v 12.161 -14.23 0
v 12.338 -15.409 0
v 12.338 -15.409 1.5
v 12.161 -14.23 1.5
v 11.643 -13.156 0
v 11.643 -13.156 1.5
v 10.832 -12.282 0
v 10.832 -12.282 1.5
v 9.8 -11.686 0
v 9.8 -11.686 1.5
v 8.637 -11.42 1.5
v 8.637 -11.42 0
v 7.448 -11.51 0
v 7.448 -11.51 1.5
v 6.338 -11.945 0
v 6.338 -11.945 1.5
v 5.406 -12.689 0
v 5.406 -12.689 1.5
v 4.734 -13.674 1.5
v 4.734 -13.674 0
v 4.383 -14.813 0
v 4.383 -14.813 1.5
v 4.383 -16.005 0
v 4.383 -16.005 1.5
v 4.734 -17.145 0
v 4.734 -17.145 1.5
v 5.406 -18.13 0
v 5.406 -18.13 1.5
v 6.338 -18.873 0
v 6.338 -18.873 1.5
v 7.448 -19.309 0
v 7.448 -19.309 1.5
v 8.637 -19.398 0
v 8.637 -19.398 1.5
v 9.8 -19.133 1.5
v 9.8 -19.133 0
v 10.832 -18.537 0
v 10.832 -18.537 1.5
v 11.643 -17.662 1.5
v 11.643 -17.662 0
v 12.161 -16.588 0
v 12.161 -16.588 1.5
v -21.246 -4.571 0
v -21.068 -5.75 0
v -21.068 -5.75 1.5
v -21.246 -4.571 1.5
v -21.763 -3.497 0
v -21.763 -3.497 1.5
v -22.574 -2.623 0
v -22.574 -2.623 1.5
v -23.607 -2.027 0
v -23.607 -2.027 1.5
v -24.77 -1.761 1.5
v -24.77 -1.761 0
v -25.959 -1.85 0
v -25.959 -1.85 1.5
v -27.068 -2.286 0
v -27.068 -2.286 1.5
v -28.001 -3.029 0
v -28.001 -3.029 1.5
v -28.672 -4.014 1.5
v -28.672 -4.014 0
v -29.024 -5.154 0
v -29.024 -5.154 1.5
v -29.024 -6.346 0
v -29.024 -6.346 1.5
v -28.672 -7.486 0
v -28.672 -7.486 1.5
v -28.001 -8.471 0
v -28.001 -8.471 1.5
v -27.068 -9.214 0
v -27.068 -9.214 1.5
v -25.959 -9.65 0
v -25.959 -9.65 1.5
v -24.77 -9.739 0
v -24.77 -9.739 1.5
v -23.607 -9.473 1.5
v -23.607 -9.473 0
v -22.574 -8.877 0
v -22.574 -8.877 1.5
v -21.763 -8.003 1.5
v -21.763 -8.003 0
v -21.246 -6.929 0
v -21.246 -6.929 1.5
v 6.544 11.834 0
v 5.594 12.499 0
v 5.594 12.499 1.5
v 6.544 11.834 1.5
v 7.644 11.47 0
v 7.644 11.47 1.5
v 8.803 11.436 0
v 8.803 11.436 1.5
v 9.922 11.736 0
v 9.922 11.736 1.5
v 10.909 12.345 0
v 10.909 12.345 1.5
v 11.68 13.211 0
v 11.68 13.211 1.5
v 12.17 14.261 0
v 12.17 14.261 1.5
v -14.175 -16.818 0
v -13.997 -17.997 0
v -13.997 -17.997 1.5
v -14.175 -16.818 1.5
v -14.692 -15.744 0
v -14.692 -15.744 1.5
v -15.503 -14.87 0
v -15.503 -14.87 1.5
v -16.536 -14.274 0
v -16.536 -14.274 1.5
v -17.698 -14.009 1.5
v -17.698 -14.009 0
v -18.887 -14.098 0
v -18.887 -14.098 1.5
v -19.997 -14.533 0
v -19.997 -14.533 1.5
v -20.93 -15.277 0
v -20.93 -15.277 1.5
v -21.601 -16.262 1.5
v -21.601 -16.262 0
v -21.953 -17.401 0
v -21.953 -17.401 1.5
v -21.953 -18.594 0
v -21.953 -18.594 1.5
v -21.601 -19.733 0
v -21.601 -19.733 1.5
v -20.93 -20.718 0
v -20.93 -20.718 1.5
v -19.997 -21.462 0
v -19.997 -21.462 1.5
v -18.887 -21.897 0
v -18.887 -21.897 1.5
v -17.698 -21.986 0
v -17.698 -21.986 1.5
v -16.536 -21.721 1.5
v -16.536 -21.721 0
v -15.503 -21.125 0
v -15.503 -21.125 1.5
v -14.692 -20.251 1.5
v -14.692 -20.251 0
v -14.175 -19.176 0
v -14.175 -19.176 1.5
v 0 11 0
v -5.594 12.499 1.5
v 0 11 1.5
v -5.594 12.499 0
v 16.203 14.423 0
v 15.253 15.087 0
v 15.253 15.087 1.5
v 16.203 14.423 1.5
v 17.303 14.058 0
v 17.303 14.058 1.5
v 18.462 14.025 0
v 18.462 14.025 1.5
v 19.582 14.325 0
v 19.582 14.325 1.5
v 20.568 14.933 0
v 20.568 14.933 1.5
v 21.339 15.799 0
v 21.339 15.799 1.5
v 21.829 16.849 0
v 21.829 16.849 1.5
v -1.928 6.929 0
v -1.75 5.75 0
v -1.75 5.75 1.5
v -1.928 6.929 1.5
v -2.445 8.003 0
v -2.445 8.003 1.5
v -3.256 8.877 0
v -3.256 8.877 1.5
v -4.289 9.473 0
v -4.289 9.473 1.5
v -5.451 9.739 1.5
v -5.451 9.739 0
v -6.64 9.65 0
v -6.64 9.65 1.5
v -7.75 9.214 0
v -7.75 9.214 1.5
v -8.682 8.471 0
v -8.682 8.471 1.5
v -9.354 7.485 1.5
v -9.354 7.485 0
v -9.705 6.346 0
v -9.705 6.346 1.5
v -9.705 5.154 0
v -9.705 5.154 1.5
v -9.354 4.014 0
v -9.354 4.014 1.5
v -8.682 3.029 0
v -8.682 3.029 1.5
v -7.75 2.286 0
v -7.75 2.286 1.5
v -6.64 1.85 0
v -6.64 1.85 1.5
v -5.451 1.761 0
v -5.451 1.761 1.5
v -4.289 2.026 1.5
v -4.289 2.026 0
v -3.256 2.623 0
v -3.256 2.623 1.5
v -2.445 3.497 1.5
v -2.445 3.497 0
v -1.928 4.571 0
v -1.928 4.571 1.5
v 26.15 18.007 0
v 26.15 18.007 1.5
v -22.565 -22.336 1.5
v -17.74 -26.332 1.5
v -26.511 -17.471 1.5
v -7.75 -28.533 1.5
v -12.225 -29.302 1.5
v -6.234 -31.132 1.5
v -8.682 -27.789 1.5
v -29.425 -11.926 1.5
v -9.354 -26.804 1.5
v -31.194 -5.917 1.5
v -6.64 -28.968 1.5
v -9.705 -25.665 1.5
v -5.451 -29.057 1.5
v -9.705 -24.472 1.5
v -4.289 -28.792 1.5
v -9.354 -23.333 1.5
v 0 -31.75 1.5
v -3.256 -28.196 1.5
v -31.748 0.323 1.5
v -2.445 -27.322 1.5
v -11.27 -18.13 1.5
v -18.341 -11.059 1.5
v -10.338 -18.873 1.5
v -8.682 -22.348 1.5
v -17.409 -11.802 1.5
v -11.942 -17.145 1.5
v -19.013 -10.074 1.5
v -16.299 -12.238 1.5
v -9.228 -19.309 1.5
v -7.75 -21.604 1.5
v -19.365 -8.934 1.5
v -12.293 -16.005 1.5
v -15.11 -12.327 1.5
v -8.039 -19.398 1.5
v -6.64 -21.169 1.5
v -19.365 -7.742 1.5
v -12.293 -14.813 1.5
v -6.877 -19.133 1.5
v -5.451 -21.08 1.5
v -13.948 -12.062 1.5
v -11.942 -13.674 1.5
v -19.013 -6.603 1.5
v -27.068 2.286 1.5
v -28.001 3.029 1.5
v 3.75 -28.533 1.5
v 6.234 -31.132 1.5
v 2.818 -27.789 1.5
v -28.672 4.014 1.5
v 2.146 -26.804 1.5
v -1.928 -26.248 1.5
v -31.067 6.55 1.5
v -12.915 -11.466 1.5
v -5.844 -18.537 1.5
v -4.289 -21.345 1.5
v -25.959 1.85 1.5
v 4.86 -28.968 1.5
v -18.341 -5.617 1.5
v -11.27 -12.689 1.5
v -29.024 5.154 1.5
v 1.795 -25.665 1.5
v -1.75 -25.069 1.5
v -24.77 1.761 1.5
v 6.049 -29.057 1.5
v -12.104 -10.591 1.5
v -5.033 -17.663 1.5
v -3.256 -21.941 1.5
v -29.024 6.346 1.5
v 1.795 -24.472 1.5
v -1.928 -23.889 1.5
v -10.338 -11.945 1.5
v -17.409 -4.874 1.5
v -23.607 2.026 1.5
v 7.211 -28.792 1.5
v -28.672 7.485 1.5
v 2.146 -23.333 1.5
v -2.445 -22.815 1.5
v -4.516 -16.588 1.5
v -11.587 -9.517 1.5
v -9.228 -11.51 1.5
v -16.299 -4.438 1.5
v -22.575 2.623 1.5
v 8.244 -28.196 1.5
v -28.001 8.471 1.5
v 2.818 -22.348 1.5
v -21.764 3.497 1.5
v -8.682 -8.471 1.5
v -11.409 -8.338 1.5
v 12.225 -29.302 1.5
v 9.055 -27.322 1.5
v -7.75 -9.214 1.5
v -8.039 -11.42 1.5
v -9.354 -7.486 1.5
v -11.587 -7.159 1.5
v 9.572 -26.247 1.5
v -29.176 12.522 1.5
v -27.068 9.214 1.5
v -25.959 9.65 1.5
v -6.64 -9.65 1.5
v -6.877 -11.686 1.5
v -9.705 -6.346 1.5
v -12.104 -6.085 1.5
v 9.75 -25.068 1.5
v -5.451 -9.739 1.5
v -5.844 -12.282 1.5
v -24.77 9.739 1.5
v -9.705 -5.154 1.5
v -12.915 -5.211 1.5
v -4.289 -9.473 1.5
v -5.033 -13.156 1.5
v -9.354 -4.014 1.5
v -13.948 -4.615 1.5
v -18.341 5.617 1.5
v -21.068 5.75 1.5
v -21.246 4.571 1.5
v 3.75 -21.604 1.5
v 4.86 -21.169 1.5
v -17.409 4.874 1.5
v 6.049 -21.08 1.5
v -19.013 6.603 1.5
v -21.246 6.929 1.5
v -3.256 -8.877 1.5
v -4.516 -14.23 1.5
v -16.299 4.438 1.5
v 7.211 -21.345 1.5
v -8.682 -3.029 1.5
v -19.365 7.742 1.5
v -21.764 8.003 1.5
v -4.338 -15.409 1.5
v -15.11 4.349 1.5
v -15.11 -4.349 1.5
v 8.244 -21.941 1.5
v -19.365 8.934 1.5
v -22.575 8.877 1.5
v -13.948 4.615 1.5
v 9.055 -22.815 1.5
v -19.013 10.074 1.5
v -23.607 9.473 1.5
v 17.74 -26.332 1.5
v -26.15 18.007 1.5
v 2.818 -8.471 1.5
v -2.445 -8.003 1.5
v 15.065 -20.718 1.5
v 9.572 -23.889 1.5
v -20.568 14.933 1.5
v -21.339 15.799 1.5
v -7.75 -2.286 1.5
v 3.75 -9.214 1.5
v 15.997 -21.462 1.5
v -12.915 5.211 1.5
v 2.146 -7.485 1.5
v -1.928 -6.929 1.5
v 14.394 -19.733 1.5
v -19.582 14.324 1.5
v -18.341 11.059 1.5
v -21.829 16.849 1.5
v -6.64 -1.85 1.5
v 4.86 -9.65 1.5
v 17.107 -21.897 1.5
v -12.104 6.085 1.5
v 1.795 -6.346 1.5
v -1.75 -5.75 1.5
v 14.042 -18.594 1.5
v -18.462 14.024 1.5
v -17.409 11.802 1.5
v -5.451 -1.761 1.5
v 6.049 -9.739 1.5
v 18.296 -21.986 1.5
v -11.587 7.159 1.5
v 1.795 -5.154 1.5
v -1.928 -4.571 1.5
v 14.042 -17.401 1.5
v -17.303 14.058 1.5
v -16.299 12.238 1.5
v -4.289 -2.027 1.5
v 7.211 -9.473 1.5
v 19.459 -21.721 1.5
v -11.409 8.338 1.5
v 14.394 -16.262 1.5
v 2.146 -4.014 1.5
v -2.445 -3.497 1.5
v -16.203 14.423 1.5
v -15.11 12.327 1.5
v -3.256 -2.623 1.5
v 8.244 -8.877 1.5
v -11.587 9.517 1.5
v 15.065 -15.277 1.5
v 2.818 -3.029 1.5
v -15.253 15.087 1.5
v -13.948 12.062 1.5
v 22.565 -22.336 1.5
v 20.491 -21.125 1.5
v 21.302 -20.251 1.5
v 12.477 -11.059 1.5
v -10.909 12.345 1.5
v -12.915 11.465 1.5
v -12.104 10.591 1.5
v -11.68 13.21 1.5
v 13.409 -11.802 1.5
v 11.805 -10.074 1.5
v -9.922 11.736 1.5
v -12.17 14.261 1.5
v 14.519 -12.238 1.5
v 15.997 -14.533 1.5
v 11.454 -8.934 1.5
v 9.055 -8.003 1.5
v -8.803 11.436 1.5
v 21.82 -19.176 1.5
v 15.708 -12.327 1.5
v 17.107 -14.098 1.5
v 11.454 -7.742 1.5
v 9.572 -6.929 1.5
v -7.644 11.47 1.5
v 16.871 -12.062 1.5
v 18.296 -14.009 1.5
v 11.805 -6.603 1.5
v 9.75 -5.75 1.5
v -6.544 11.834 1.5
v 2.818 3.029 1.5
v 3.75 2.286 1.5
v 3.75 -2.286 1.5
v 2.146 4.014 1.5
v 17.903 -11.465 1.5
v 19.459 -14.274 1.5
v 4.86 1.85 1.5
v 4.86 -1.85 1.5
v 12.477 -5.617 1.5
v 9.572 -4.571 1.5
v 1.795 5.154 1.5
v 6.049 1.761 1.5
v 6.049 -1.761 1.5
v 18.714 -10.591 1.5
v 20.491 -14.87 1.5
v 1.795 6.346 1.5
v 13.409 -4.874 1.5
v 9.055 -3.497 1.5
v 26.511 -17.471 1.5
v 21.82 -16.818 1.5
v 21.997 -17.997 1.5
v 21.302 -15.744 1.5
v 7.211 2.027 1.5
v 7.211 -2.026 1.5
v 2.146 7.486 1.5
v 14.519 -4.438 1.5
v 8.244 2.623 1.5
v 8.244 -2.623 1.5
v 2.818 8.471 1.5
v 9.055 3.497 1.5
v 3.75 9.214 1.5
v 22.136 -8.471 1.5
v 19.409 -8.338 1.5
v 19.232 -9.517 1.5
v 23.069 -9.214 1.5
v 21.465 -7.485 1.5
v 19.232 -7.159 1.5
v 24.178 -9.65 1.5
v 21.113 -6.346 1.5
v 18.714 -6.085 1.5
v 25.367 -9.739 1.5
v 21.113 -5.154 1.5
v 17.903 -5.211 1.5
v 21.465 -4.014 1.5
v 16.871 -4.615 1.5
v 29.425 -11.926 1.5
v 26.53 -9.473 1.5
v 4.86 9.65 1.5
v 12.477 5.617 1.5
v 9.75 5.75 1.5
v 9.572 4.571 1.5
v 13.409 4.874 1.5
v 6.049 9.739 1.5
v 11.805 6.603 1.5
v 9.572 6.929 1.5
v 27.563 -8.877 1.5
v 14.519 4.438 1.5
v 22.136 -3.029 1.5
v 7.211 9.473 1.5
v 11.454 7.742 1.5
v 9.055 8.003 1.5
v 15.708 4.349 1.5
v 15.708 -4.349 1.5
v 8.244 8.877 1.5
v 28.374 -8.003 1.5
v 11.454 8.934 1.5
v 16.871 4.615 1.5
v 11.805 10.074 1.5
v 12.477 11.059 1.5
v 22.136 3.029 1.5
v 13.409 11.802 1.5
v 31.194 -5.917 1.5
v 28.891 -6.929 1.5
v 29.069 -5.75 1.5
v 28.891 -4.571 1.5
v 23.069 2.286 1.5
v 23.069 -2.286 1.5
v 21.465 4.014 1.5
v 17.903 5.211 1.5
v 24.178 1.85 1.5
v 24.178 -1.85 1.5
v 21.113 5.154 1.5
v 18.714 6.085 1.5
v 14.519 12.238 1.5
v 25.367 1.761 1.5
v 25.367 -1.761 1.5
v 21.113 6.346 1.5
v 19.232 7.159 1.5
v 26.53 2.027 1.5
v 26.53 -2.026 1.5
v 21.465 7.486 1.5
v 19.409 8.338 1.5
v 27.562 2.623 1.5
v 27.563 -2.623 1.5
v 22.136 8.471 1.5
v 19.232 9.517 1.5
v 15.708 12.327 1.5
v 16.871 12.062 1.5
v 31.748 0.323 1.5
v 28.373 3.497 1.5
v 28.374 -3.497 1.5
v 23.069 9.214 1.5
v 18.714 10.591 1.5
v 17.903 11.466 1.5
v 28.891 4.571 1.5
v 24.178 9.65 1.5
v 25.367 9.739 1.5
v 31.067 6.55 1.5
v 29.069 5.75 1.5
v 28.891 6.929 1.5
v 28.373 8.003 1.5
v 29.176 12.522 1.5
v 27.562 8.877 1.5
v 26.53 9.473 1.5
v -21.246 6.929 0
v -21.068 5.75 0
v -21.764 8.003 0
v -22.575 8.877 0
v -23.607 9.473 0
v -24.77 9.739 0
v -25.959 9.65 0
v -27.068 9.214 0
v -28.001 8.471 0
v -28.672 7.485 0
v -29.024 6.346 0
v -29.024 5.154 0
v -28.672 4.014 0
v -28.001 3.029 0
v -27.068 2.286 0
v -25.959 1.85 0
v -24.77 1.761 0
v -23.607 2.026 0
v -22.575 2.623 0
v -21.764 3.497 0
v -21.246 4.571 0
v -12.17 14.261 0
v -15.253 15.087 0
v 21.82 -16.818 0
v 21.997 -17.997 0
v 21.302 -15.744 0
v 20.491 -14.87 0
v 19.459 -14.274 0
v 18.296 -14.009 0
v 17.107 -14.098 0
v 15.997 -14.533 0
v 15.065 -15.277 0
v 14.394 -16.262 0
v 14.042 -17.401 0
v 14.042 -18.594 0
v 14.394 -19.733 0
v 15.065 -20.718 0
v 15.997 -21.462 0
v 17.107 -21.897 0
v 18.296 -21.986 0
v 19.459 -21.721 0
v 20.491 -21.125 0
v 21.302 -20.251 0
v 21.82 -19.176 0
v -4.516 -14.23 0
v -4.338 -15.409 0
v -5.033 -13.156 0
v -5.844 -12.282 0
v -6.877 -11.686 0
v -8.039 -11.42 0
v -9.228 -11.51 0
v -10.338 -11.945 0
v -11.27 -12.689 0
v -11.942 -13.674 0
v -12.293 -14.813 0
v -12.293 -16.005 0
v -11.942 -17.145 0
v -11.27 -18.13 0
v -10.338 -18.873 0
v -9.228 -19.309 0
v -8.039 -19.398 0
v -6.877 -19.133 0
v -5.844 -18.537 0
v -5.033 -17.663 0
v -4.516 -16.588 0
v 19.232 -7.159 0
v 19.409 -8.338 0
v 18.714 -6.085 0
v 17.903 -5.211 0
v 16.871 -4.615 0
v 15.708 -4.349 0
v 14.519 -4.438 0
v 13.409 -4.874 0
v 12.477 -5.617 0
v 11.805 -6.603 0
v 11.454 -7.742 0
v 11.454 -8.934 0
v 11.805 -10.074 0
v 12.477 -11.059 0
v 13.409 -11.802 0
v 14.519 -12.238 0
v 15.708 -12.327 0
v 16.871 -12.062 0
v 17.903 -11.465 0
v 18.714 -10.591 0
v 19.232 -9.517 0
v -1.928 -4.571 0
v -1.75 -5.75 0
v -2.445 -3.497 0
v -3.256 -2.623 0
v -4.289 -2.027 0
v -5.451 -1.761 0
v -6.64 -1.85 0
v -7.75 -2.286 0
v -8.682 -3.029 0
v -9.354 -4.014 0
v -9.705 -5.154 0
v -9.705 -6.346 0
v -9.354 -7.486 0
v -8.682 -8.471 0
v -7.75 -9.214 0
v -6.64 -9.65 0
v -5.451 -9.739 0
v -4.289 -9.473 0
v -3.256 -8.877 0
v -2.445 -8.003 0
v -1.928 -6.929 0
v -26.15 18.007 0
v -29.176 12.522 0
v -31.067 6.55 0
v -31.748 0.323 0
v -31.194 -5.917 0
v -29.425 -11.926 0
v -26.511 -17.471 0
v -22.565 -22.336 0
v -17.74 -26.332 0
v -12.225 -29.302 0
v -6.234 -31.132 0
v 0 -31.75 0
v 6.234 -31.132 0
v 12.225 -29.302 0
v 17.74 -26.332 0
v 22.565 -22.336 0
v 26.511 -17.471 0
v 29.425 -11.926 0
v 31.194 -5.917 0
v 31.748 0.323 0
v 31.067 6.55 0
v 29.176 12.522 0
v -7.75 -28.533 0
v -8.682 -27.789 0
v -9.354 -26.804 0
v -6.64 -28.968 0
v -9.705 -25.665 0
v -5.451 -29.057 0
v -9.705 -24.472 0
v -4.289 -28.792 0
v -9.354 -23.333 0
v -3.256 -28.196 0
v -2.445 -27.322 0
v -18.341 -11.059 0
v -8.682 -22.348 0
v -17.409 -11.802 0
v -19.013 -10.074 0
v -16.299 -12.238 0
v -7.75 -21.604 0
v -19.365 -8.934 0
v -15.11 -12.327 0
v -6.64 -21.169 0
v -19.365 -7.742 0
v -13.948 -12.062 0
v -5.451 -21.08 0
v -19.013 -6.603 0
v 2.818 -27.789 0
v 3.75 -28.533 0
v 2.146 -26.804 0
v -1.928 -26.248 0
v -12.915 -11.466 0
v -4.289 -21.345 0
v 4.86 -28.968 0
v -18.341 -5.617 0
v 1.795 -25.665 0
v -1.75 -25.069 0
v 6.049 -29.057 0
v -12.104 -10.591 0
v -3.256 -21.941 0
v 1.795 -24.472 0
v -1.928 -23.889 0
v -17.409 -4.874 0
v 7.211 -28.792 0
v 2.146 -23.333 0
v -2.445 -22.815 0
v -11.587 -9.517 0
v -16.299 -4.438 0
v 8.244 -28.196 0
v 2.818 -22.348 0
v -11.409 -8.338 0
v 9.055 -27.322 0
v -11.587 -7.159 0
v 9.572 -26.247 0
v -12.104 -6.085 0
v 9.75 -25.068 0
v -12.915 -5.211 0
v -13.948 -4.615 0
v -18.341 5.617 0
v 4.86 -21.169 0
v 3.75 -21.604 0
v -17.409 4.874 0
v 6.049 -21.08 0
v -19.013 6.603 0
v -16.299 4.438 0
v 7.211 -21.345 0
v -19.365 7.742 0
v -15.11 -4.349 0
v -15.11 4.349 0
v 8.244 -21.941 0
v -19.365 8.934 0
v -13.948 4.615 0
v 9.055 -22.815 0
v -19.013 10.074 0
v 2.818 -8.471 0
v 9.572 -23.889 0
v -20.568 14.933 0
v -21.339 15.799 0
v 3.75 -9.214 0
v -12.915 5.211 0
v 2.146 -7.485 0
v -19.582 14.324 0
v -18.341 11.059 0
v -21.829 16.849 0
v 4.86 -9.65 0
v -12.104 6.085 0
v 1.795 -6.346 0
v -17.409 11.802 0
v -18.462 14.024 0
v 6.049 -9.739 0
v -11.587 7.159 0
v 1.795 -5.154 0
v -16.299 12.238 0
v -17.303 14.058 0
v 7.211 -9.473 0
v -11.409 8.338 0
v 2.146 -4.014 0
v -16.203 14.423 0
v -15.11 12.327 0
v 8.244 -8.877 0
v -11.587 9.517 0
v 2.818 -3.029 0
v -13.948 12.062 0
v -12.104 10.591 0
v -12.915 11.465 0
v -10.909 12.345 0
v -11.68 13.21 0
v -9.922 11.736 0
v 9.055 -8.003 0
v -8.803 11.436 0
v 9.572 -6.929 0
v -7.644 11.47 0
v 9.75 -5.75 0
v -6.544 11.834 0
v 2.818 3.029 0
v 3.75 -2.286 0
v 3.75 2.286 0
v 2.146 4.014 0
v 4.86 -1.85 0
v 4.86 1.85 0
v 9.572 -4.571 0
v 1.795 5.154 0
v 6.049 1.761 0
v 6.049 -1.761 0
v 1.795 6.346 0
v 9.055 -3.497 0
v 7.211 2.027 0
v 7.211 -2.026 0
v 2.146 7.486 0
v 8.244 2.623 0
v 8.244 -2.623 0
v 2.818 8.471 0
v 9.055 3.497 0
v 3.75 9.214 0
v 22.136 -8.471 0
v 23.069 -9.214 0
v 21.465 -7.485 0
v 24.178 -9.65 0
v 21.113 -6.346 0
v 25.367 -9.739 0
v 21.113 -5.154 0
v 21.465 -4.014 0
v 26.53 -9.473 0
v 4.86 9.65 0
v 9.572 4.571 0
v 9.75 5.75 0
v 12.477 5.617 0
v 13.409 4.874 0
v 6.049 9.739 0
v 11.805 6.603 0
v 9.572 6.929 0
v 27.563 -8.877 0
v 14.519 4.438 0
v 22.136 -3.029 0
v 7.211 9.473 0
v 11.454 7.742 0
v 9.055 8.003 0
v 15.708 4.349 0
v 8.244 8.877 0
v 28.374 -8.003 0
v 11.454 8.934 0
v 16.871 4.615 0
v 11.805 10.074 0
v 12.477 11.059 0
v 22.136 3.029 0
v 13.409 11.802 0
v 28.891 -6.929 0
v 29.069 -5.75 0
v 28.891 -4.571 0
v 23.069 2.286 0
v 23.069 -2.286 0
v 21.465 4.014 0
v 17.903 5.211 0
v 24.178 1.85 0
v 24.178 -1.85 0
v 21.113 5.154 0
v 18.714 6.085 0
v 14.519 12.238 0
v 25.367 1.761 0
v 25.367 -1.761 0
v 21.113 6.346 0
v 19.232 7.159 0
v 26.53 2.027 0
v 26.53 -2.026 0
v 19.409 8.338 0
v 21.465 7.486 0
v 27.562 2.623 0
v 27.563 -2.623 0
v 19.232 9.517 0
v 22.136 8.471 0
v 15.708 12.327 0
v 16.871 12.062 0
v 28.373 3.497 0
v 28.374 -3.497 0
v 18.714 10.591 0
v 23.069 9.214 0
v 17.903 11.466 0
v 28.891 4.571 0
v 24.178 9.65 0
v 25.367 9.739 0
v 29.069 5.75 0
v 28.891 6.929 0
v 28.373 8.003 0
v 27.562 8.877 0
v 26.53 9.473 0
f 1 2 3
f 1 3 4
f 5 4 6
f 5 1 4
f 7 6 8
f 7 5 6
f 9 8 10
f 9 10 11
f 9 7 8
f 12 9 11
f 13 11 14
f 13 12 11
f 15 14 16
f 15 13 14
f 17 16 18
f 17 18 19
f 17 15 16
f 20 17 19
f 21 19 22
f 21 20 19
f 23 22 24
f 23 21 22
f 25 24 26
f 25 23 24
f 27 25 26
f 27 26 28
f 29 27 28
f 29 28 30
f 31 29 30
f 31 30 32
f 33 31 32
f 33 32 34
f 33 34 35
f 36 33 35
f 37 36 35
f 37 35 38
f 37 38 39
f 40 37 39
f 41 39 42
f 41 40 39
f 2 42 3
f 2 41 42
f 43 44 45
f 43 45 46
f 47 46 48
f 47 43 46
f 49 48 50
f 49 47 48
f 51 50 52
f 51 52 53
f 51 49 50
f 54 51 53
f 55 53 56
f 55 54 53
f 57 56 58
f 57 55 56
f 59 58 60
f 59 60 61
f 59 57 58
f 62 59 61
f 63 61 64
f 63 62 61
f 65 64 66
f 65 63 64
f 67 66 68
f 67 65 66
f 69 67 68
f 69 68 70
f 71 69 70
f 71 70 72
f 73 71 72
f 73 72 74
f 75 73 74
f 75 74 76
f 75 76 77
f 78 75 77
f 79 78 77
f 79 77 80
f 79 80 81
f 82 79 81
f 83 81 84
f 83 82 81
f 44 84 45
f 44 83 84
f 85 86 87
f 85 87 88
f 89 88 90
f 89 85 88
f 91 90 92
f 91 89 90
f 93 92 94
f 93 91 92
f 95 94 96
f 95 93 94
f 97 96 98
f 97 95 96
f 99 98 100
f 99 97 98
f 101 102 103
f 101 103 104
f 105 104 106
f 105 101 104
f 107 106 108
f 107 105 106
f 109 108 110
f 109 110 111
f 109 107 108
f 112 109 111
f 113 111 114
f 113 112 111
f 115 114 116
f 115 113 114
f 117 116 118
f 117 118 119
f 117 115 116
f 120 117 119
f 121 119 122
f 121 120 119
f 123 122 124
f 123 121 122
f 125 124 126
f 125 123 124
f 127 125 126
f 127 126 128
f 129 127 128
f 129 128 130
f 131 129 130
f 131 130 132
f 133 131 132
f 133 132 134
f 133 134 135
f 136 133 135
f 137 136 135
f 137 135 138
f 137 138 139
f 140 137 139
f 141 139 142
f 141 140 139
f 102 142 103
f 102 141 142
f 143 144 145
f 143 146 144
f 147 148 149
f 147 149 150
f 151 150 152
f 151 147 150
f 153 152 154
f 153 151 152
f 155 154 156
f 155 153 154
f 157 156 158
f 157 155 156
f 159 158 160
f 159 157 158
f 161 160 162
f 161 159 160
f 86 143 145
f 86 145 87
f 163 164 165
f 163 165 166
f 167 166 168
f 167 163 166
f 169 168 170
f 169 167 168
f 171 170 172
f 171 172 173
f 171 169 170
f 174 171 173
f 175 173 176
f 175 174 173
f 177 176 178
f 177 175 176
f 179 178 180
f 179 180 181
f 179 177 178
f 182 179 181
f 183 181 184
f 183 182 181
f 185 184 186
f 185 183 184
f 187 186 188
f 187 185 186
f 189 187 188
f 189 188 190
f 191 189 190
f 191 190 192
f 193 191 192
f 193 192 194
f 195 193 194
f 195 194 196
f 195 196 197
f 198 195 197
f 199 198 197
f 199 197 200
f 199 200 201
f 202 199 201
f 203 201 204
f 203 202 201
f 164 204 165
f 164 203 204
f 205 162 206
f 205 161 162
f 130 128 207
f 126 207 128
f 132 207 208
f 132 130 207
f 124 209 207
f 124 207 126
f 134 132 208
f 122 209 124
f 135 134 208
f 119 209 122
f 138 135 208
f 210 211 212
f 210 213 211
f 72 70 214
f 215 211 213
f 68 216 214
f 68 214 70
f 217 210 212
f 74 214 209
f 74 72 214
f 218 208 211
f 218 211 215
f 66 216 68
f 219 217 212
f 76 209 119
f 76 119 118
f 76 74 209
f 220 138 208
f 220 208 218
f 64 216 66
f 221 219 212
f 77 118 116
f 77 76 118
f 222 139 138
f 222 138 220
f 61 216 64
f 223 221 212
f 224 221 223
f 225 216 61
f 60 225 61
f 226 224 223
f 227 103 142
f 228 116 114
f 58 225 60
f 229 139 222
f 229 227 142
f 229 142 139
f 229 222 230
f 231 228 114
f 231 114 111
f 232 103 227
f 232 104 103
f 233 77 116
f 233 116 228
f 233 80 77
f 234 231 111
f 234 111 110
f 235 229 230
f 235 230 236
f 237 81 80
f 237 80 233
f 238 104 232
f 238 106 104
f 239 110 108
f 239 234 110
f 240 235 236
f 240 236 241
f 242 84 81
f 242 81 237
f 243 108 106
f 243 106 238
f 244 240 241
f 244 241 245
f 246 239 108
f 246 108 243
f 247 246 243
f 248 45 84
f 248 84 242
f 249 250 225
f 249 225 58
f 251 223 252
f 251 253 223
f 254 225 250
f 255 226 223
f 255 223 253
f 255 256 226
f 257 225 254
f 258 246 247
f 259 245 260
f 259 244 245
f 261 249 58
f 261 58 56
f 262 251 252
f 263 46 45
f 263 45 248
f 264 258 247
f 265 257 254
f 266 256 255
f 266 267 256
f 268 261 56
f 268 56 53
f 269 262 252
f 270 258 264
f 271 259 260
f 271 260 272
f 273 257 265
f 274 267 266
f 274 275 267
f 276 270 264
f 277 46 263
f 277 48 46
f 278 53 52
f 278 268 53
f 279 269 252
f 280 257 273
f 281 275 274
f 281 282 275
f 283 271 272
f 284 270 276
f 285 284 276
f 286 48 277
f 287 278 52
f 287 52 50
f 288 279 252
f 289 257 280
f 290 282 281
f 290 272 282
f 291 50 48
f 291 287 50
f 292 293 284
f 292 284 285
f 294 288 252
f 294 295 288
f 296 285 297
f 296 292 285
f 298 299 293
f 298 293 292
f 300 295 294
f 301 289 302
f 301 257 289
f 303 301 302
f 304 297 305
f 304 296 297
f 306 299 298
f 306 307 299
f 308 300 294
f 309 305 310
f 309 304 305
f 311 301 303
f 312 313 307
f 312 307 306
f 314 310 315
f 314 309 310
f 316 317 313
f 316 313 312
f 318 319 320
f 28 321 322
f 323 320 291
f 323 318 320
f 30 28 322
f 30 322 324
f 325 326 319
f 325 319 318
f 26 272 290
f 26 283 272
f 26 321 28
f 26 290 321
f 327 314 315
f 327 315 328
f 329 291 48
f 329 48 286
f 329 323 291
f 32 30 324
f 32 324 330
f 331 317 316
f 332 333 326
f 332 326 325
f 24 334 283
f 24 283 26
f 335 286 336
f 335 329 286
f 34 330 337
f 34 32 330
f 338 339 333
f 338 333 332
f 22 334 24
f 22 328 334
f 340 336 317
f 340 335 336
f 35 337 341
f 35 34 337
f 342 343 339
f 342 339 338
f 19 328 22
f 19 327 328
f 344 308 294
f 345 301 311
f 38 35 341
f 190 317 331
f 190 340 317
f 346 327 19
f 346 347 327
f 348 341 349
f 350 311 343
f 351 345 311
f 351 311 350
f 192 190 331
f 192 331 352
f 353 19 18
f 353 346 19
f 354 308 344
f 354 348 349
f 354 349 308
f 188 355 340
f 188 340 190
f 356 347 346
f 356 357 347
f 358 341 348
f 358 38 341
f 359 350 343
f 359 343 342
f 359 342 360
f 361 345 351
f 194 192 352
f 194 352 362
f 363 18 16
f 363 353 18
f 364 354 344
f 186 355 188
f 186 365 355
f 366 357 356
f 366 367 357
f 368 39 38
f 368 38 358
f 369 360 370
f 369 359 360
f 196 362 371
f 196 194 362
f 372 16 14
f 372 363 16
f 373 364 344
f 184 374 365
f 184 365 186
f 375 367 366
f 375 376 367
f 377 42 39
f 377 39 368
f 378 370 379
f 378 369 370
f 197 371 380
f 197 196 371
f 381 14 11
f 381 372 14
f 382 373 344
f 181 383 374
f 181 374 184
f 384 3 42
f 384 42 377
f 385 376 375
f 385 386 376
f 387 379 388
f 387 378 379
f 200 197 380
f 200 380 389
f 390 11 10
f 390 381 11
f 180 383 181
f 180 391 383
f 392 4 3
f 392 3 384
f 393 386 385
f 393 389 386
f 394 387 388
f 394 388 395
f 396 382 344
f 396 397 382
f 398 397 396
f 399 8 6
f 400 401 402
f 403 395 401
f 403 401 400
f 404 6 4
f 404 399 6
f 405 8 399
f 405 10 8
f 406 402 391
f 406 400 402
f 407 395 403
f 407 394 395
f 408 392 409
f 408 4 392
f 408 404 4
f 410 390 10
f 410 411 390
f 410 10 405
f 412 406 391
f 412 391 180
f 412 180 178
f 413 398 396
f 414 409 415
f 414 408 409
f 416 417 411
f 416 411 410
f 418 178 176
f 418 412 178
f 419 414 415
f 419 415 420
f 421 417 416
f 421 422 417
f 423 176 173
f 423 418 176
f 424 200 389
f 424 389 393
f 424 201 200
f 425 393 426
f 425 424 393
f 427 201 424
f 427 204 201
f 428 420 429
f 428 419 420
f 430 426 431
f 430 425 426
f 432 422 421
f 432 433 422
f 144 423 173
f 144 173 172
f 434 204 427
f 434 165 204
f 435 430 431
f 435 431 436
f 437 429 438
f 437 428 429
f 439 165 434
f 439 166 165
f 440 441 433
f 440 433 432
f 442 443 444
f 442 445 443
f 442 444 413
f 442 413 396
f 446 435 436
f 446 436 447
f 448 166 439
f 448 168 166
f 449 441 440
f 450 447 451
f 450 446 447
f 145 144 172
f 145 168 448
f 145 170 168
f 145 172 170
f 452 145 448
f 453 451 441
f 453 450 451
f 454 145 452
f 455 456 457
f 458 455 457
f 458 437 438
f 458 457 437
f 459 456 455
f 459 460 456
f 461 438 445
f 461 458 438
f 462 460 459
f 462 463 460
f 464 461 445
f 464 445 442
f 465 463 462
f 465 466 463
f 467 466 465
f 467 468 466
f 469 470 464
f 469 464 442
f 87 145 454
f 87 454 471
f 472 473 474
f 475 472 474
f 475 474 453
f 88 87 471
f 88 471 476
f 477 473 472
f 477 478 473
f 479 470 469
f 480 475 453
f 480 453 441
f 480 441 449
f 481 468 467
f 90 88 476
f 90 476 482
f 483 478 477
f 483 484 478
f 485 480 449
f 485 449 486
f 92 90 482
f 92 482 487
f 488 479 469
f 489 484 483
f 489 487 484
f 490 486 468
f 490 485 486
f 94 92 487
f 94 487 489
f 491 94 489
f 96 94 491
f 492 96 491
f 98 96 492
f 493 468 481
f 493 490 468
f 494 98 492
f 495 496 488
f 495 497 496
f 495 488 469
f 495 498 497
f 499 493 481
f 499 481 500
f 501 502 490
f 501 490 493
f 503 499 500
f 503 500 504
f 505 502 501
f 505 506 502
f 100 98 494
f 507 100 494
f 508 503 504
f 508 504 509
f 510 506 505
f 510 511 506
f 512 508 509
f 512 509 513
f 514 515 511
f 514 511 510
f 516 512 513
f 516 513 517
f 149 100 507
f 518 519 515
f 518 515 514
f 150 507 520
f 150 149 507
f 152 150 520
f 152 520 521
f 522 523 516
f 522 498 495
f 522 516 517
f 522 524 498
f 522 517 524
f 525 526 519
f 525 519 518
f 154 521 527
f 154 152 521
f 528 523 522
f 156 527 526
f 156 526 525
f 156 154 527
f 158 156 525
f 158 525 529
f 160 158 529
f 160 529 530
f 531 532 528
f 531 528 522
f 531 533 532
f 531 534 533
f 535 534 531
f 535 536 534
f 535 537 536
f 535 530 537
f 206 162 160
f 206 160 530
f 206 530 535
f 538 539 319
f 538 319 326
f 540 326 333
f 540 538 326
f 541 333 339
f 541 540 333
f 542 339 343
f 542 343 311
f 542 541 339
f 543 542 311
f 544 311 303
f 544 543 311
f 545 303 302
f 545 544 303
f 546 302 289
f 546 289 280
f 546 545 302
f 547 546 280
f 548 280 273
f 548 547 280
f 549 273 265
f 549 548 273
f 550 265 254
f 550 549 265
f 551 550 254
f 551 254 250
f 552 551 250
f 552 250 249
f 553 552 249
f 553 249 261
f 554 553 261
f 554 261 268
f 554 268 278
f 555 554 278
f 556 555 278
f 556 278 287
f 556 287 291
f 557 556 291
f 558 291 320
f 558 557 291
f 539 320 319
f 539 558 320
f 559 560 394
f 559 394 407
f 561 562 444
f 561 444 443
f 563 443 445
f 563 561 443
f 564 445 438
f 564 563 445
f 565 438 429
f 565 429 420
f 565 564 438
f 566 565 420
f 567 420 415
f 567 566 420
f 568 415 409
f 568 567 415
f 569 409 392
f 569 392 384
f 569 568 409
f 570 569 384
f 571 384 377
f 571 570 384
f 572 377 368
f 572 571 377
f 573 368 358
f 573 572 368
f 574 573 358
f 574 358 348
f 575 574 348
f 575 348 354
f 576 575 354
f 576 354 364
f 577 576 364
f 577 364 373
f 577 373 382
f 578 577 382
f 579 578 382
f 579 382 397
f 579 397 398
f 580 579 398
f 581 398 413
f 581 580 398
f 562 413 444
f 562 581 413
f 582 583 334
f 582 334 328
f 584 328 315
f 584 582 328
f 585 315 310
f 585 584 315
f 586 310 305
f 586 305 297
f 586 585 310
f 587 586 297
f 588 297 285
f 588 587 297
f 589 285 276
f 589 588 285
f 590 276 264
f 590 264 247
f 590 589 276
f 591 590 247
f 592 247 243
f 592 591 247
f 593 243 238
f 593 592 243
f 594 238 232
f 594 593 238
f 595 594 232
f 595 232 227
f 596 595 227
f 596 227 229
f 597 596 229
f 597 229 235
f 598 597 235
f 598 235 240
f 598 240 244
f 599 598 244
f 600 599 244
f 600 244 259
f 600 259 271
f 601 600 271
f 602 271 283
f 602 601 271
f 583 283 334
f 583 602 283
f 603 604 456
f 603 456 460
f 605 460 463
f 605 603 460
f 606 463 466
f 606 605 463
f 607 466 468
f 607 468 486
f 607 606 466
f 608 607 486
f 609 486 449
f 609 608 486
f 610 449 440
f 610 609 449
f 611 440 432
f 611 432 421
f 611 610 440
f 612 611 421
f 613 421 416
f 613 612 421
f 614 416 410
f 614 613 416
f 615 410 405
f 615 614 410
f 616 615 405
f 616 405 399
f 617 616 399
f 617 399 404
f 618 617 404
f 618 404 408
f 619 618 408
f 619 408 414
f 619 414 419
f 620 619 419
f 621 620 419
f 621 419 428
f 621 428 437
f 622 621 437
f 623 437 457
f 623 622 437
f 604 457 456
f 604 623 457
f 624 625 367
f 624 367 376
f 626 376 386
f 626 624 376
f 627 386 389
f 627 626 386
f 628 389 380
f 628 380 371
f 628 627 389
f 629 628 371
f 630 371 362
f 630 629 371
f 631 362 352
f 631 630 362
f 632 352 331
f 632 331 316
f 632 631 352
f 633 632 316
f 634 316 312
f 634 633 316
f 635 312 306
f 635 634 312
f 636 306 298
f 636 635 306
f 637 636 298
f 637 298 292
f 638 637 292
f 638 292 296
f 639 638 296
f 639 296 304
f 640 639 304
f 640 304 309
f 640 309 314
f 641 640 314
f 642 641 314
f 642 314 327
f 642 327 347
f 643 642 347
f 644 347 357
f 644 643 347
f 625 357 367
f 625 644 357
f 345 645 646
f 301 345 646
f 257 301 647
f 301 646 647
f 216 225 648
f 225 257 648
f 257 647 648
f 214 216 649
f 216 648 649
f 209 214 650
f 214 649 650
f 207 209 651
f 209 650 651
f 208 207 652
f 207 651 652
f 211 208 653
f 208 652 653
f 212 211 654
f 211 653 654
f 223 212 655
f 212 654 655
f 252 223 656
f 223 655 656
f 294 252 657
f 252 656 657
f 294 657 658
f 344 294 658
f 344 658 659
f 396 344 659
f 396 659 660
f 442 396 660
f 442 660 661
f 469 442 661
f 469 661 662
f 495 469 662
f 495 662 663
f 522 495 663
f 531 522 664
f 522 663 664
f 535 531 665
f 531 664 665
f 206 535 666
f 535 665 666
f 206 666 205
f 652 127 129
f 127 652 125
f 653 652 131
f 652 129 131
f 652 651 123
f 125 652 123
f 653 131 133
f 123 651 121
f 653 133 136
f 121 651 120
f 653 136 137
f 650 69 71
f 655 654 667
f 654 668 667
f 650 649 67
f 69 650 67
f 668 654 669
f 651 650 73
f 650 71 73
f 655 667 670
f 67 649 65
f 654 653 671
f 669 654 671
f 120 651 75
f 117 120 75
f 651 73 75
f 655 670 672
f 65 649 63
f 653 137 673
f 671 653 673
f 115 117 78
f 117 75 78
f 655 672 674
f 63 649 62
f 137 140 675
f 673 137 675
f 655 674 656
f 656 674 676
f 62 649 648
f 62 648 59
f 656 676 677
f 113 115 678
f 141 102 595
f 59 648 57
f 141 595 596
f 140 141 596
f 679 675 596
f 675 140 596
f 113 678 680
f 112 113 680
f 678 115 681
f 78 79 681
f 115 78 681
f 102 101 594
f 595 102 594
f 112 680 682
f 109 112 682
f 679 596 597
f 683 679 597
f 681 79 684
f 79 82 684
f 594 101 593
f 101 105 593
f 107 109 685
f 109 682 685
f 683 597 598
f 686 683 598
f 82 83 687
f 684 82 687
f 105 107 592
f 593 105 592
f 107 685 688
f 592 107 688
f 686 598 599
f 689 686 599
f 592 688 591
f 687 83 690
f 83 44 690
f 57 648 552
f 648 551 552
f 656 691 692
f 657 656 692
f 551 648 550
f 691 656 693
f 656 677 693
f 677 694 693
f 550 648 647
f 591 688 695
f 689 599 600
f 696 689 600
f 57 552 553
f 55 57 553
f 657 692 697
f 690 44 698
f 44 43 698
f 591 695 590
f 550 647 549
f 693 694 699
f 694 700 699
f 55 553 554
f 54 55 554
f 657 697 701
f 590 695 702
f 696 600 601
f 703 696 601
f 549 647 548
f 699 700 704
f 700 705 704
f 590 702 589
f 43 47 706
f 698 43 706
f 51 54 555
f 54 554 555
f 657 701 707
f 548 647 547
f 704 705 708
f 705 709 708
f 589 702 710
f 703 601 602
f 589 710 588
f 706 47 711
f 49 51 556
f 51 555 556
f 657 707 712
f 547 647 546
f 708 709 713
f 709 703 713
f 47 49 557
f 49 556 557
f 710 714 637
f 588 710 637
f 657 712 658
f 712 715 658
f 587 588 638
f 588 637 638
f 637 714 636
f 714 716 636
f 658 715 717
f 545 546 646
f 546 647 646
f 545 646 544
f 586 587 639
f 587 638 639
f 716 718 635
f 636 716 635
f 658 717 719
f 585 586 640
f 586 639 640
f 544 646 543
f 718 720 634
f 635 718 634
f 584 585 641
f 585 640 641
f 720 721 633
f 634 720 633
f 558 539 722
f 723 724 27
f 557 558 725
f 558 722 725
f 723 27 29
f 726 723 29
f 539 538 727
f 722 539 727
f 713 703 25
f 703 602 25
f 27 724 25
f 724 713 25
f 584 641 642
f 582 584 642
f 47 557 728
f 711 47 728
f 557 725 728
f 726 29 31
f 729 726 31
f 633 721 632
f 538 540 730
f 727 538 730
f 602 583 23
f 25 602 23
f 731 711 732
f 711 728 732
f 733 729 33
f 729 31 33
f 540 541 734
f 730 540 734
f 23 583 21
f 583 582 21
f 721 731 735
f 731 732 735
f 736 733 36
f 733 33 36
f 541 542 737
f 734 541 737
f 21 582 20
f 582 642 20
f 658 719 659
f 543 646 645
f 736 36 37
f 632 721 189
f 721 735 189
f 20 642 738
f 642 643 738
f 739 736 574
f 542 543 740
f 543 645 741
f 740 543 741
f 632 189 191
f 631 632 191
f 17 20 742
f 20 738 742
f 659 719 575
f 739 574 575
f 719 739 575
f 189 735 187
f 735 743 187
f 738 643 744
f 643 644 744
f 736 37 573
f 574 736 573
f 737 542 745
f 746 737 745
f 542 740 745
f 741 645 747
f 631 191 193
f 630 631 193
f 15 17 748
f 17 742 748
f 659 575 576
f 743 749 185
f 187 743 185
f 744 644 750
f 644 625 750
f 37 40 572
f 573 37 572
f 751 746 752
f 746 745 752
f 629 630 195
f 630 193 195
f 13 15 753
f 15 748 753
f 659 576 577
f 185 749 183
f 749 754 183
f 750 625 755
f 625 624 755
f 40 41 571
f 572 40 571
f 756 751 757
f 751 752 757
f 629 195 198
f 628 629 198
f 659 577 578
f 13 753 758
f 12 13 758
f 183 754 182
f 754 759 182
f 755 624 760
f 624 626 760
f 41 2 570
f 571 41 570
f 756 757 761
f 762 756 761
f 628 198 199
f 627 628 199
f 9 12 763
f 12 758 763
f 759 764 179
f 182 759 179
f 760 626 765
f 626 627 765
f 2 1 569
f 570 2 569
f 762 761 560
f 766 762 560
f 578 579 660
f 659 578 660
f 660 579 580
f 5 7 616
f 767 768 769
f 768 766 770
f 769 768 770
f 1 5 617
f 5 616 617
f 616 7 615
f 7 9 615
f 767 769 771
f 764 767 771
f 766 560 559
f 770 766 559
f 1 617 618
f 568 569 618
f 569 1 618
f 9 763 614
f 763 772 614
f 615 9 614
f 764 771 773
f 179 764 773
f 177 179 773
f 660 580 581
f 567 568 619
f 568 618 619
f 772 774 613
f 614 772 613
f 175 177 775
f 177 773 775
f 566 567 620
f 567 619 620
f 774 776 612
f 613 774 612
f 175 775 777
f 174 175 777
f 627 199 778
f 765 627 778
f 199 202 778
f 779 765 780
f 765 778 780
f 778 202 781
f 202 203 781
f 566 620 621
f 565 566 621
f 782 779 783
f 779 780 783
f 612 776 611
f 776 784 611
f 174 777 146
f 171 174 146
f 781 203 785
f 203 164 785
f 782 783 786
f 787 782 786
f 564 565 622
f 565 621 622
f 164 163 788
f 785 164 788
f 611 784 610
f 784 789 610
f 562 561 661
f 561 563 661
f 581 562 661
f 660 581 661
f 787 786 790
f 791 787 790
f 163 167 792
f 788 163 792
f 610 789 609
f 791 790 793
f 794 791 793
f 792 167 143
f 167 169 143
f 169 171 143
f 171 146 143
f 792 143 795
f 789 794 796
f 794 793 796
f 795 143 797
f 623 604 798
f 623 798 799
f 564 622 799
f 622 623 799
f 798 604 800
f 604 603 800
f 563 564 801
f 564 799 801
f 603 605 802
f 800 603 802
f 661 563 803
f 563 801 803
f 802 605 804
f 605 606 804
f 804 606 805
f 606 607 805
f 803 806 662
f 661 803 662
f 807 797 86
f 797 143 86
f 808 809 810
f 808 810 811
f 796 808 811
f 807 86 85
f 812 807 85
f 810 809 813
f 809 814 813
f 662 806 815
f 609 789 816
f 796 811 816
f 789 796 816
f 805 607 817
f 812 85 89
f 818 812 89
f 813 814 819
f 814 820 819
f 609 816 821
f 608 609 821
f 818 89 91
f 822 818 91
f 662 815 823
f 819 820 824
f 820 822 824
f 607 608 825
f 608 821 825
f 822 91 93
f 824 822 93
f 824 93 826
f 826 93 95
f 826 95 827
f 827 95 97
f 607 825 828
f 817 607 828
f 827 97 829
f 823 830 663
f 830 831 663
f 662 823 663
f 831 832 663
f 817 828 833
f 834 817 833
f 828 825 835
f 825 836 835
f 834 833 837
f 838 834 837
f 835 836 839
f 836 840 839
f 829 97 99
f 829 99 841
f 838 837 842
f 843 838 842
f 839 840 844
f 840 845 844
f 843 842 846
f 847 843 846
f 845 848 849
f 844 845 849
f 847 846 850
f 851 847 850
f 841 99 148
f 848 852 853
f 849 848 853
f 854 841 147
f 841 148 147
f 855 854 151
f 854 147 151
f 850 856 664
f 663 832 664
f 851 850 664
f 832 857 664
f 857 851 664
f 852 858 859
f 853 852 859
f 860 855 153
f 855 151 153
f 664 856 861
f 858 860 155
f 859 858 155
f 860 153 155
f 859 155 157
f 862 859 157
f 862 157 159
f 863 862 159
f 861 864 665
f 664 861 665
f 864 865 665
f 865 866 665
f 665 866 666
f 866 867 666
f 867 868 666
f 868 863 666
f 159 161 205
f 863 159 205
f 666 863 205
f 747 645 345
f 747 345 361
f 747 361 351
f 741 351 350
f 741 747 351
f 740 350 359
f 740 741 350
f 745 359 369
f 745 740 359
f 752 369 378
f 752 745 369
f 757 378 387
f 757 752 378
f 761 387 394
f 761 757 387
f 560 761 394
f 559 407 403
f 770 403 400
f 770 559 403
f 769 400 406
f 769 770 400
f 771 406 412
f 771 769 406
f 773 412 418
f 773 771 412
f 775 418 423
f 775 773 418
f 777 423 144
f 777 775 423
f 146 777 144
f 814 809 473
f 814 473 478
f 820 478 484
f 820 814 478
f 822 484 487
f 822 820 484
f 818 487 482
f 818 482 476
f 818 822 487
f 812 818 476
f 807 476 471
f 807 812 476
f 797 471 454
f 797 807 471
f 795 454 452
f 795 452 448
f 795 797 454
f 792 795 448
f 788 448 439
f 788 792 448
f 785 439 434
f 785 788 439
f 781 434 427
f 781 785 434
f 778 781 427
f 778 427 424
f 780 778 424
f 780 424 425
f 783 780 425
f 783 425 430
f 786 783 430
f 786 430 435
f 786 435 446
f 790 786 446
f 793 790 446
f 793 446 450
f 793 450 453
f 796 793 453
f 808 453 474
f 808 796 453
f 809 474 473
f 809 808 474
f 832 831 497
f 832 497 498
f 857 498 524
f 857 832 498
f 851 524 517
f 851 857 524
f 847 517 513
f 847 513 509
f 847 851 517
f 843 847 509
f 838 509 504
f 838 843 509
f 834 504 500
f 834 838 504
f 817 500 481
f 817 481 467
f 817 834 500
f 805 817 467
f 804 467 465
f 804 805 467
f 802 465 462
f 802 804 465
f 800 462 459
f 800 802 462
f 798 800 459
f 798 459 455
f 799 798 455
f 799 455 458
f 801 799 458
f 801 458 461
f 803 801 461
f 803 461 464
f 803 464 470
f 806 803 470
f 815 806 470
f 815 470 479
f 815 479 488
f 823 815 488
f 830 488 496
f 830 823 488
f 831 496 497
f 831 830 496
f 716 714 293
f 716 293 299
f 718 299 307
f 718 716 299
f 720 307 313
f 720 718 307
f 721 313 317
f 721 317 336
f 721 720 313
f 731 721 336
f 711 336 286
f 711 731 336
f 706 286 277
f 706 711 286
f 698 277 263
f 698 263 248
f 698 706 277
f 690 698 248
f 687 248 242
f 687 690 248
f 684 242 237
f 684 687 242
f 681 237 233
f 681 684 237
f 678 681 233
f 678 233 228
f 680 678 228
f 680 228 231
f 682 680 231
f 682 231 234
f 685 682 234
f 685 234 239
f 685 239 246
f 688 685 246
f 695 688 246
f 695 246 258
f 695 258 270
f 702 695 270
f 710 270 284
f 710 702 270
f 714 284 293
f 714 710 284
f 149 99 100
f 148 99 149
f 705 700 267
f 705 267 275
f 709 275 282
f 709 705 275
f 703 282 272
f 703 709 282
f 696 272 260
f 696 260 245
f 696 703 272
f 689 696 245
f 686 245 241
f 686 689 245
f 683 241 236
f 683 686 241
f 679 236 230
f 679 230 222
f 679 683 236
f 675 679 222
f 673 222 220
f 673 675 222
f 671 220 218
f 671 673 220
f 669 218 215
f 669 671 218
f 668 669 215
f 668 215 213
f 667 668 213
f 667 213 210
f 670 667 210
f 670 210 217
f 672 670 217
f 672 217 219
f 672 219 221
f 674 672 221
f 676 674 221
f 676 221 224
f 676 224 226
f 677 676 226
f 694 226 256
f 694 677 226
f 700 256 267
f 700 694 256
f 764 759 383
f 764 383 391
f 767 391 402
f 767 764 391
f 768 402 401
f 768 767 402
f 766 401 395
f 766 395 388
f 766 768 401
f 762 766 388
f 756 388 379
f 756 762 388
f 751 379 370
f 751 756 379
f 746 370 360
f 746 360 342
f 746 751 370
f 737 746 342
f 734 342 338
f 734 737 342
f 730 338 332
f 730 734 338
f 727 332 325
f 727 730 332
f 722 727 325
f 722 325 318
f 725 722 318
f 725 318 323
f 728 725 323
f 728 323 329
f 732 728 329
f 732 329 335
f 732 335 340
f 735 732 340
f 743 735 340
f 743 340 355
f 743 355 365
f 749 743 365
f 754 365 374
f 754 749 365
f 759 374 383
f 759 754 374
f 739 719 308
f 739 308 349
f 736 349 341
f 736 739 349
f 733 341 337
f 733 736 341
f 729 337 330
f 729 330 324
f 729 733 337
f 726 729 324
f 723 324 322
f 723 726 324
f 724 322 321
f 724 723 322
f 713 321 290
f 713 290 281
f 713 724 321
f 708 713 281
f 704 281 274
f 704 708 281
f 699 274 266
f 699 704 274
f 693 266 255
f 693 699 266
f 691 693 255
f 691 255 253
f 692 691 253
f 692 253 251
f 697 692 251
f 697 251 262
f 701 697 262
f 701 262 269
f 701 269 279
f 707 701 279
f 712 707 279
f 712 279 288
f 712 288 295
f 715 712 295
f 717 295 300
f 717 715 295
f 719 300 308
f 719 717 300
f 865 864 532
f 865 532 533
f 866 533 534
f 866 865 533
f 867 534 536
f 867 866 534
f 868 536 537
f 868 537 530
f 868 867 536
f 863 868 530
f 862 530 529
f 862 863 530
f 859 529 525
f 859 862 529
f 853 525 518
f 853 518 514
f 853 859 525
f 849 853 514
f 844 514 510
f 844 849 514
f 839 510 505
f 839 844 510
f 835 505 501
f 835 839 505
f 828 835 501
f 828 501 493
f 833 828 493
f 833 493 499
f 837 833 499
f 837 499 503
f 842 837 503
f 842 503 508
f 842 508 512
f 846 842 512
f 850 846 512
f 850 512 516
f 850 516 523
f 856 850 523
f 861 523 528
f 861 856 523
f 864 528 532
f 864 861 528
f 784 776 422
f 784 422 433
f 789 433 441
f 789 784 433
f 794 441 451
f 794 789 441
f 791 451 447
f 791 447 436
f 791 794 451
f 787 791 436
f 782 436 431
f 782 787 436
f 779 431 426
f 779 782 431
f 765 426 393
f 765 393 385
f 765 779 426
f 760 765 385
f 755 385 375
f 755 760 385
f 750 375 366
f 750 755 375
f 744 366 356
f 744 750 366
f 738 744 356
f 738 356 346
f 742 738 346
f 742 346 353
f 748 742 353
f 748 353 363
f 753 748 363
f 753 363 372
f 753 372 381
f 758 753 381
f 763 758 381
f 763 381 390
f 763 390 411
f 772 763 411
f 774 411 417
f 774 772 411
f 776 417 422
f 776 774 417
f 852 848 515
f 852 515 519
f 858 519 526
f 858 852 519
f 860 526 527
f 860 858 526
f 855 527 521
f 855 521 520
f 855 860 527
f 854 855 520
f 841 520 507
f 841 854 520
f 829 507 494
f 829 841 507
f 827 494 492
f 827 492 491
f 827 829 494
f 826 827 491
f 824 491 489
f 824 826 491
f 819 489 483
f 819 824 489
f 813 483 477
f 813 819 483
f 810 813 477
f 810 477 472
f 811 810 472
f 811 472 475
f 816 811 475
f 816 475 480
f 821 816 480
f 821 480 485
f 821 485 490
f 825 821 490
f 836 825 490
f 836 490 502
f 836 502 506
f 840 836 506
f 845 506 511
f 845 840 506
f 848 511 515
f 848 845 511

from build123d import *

# Parameters (mm, degrees)
SKETCH1_R           = 31.75
SKETCH1_R_2         = 4
BOSS_EXTRUDE1_DEPTH = 1.5
CUT_EXTRUDE1_DEPTH  = 45.926328584


with BuildPart() as part:
    # Sketch1 → Boss-Extrude1 (new body)
    with BuildSketch(Plane.XY):
        Circle(SKETCH1_R)
        with Locations((5.75, 5.75)):
            Circle(SKETCH1_R_2, mode=Mode.SUBTRACT)
        with Locations((8.338190451, 15.409258263)):
            Circle(SKETCH1_R_2, mode=Mode.SUBTRACT)
        with Locations((17.997448714, 17.997448714)):
            Circle(SKETCH1_R_2, mode=Mode.SUBTRACT)
        with Locations((15.409258263, 8.338190451)):
            Circle(SKETCH1_R_2, mode=Mode.SUBTRACT)
        with Locations((25.068516526, 5.75)):
            Circle(SKETCH1_R_2, mode=Mode.SUBTRACT)
        with Locations((5.75, 25.068516526)):
            Circle(SKETCH1_R_2, mode=Mode.SUBTRACT)
        with Locations((25.068556101, -5.749960425)):
            Circle(SKETCH1_R_2, mode=Mode.SUBTRACT)
        with Locations((15.409297838, -8.338150876)):
            Circle(SKETCH1_R_2, mode=Mode.SUBTRACT)
        with Locations((17.997488289, -17.997409139)):
            Circle(SKETCH1_R_2, mode=Mode.SUBTRACT)
        with Locations((8.338230026, -15.409218688)):
            Circle(SKETCH1_R_2, mode=Mode.SUBTRACT)
        with Locations((5.750039575, -25.068476951)):
            Circle(SKETCH1_R_2, mode=Mode.SUBTRACT)
        with Locations((5.750039575, -5.749960425)):
            Circle(SKETCH1_R_2, mode=Mode.SUBTRACT)
        with Locations((-5.74992085, -25.068516526)):
            Circle(SKETCH1_R_2, mode=Mode.SUBTRACT)
        with Locations((-8.338111301, -15.409258263)):
            Circle(SKETCH1_R_2, mode=Mode.SUBTRACT)
        with Locations((-17.997369564, -17.997448714)):
            Circle(SKETCH1_R_2, mode=Mode.SUBTRACT)
        with Locations((-15.409179113, -8.338190451)):
            Circle(SKETCH1_R_2, mode=Mode.SUBTRACT)
        with Locations((-25.068437376, -5.75)):
            Circle(SKETCH1_R_2, mode=Mode.SUBTRACT)
        with Locations((-5.74992085, -5.75)):
            Circle(SKETCH1_R_2, mode=Mode.SUBTRACT)
        with Locations((-25.068476951, 5.749960425)):
            Circle(SKETCH1_R_2, mode=Mode.SUBTRACT)
        with Locations((-15.409218688, 8.338150876)):
            Circle(SKETCH1_R_2, mode=Mode.SUBTRACT)
        with Locations((-17.997409139, 17.997409139)):
            Circle(SKETCH1_R_2, mode=Mode.SUBTRACT)
        with Locations((-8.338150876, 15.409218688)):
            Circle(SKETCH1_R_2, mode=Mode.SUBTRACT)
        with Locations((-5.749960425, 25.068476951)):
            Circle(SKETCH1_R_2, mode=Mode.SUBTRACT)
        with Locations((-5.749960425, 5.749960425)):
            Circle(SKETCH1_R_2, mode=Mode.SUBTRACT)
    extrude(amount=BOSS_EXTRUDE1_DEPTH)

    # Sketch2 → Cut-Extrude1 (cut, through all)
    with BuildSketch(Plane.XY):
        with BuildLine():
            Line((-26.149880274, 18.006839302), (0, 11))
            Line((0, 11), (26.149880274, 18.006839302))
            ThreePointArc((26.149880274, 18.006839302), (0, 31.75), (-26.149880274, 18.006839302))
        make_face()
    extrude(amount=CUT_EXTRUDE1_DEPTH, mode=Mode.SUBTRACT)


solid = part.part
